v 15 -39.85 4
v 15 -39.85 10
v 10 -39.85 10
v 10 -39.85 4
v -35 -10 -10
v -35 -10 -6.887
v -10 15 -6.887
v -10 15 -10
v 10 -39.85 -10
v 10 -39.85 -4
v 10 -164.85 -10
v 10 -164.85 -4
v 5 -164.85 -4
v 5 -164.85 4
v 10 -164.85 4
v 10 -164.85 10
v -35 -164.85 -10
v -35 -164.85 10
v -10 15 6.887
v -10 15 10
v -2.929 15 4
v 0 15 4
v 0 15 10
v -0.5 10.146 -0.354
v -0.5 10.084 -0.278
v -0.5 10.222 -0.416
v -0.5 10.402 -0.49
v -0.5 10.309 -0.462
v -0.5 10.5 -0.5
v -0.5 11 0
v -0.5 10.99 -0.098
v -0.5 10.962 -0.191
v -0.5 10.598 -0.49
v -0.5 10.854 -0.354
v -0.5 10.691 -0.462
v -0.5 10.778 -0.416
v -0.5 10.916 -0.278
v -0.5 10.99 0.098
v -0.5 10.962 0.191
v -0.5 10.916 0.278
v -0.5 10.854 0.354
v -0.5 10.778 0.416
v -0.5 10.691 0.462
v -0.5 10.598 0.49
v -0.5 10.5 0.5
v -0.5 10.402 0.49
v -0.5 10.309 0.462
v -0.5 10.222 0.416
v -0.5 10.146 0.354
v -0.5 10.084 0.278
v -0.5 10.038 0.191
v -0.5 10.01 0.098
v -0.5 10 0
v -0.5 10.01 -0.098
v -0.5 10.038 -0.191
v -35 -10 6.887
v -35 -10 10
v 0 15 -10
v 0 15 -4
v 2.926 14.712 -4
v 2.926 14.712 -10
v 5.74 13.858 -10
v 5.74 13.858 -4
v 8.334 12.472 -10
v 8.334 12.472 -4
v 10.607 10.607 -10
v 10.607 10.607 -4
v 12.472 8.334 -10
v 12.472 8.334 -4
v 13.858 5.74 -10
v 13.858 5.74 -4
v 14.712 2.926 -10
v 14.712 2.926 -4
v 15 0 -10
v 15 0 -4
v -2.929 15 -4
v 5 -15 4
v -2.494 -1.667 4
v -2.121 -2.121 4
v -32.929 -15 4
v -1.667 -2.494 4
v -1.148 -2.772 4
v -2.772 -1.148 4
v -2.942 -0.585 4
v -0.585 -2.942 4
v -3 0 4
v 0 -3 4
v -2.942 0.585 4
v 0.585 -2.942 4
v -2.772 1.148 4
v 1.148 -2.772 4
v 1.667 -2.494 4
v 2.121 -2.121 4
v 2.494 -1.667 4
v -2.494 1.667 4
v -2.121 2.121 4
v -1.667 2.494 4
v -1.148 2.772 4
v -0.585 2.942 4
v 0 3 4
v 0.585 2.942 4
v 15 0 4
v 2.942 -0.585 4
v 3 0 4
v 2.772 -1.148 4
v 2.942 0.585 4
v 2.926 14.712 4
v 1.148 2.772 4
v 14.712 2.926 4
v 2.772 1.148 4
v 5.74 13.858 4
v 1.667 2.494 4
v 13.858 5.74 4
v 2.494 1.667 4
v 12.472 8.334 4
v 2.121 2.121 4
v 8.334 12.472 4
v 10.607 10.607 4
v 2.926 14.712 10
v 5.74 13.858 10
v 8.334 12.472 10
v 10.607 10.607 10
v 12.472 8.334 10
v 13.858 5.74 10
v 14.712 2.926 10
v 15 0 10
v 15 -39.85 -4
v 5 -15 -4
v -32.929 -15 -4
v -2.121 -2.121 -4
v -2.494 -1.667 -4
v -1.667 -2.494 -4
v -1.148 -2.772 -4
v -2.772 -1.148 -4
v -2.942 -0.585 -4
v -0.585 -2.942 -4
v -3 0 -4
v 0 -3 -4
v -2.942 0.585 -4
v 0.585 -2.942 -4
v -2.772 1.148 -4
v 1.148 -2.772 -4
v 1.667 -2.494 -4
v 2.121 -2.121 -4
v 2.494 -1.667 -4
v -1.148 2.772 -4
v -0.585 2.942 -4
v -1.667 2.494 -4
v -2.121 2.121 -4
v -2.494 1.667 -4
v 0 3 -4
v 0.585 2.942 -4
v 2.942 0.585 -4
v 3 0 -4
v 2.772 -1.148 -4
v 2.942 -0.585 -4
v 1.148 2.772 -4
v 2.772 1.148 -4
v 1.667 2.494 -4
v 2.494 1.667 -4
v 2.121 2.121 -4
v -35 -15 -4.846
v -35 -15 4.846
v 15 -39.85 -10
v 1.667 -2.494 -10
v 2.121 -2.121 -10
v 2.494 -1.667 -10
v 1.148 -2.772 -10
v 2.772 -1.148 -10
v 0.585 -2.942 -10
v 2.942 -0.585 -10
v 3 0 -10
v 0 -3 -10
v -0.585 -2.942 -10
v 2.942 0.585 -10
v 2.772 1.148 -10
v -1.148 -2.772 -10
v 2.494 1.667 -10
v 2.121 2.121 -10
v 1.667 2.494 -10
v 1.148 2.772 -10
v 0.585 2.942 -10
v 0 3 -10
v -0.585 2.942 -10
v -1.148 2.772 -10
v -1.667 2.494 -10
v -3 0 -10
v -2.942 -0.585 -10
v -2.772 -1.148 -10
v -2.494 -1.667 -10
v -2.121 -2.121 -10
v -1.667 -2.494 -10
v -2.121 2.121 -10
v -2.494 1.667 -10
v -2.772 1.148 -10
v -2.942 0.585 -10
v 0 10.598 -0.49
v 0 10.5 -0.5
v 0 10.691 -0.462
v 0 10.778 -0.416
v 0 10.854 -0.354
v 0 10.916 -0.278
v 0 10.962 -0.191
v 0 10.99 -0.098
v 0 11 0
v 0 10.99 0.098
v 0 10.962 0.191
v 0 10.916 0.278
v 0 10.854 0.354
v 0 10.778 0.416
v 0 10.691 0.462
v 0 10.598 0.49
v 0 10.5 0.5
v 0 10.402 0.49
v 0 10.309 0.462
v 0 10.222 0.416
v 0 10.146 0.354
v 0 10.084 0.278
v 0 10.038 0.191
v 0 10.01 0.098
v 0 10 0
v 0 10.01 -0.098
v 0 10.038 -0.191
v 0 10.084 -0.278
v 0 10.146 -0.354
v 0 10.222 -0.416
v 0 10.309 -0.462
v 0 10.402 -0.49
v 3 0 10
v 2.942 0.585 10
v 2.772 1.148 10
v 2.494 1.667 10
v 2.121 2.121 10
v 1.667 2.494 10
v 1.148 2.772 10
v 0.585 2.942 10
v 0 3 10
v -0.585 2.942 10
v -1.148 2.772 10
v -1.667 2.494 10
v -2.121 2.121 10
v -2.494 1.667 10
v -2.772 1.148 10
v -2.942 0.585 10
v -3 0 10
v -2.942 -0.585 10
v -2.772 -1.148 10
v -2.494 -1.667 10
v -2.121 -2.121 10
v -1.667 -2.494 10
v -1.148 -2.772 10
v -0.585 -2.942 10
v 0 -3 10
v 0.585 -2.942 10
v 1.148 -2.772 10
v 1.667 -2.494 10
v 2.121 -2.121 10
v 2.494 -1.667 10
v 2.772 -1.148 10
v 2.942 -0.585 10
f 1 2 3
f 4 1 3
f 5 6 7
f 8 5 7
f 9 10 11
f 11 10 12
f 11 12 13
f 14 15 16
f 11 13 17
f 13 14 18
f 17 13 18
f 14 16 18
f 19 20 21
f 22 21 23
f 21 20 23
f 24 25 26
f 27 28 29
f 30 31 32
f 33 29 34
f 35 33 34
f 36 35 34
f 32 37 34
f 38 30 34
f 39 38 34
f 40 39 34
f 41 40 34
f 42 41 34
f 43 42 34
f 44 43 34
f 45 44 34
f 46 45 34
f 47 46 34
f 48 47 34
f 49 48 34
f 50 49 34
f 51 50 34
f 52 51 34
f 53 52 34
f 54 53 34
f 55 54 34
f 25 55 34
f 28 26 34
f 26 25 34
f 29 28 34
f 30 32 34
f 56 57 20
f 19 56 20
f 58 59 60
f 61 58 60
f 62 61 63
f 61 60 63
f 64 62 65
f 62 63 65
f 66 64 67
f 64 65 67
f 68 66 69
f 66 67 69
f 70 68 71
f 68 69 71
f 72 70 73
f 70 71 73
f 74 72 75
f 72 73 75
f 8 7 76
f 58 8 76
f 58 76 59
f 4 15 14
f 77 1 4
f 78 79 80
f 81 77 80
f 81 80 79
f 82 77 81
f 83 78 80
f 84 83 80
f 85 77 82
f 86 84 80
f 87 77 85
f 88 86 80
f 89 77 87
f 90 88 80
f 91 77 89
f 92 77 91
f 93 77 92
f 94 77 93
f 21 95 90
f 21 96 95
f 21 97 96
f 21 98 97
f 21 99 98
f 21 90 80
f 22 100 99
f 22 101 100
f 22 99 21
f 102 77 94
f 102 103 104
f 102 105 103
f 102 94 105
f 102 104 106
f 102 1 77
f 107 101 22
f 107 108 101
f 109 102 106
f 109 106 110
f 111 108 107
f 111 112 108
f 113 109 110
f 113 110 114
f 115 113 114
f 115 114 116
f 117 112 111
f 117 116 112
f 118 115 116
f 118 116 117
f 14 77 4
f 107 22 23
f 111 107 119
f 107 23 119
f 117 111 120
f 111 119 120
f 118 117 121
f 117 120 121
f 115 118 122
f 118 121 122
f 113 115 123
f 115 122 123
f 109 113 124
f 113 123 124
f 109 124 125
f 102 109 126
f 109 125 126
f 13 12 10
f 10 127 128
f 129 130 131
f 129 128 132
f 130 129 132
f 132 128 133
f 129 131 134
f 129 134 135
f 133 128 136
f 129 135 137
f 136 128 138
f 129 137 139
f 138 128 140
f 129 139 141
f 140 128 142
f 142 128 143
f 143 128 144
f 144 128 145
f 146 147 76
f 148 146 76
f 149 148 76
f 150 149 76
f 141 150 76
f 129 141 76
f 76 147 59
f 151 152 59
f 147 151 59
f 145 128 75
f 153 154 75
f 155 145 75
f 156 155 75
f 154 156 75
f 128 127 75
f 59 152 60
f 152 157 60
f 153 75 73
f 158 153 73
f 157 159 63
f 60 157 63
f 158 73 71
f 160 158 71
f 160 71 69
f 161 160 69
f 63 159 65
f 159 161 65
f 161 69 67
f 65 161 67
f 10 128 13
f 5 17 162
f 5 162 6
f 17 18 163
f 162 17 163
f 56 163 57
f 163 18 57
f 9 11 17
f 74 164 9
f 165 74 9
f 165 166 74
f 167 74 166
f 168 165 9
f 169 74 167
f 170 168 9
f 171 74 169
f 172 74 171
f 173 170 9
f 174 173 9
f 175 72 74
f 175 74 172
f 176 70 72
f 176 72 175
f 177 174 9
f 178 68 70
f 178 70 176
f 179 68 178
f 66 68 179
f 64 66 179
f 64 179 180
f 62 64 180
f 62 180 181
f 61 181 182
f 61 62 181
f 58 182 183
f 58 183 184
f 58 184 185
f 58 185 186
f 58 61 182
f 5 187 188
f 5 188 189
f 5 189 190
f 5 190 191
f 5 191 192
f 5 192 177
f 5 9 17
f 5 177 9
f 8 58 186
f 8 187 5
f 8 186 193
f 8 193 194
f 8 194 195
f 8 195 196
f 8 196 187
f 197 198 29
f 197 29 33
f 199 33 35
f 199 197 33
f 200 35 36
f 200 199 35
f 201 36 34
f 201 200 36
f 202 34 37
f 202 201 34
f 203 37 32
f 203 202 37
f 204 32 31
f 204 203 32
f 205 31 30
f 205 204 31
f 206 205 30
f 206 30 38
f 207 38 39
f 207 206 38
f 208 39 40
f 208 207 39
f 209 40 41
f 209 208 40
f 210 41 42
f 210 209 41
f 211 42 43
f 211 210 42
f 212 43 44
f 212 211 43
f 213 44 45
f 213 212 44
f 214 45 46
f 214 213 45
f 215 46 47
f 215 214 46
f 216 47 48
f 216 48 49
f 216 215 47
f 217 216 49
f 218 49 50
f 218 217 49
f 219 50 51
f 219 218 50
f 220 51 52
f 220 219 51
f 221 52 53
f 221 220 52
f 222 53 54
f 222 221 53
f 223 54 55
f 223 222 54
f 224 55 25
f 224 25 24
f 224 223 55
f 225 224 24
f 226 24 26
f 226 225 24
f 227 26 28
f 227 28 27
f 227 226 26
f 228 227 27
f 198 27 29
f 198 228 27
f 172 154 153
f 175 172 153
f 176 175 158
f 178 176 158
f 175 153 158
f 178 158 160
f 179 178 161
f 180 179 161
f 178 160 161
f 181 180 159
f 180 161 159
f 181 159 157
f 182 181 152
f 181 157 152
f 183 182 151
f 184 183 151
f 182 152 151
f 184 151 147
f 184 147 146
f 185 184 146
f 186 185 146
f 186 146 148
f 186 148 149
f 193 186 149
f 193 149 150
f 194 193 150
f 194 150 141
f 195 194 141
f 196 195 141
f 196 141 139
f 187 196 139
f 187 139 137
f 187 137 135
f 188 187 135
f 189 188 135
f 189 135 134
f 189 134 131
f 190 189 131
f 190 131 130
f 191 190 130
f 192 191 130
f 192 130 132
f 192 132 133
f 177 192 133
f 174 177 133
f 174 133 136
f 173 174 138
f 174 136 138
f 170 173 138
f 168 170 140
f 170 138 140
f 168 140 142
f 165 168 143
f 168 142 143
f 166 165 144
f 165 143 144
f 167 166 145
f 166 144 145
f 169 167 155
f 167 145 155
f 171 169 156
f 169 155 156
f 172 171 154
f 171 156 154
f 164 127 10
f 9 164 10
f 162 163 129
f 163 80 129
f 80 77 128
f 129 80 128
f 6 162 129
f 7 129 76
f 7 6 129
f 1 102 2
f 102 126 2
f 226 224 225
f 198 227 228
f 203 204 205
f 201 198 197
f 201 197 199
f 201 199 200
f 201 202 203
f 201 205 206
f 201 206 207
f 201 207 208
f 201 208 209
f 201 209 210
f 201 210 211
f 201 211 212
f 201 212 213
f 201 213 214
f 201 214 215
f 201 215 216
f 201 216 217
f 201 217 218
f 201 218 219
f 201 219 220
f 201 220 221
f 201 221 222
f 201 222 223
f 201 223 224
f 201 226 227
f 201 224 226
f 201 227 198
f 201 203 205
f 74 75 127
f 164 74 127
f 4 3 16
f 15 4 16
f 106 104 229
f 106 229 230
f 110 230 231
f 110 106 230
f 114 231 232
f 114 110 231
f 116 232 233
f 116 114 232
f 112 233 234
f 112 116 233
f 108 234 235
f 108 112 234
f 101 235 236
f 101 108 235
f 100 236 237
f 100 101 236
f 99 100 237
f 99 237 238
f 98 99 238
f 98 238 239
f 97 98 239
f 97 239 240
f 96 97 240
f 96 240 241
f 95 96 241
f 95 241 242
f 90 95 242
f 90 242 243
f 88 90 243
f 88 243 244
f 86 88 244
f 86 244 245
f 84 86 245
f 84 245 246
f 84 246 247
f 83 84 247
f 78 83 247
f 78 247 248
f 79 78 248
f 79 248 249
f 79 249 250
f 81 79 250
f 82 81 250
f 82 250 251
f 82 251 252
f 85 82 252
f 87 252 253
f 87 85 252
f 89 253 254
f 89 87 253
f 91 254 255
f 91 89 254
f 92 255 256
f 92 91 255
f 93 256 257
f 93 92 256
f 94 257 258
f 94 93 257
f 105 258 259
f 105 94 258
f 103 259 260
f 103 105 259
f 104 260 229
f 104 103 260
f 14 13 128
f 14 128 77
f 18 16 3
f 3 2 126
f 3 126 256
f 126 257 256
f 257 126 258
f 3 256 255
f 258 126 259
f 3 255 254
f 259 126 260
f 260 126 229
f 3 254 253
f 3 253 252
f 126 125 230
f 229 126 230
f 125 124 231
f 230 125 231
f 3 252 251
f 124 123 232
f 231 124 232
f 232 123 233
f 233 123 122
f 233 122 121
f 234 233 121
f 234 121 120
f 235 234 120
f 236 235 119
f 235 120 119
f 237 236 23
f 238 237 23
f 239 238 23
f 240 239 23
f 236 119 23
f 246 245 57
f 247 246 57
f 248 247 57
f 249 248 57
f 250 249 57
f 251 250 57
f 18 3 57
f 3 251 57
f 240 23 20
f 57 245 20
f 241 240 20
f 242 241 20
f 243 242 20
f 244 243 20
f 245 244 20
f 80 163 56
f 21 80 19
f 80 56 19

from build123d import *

# Parameters (mm, degrees)
ESQUISSE1_R             = 3
EXTRUSION1_DEPTH        = 10
EXTRUSION1_DEPTH_BACK   = 10
ESQUISSE2_W             = 8
ESQUISSE2_H             = 38.994969405
ENL_V_MAT_EXTRU_2_DEPTH = 51
CHANFREIN1_SIZE         = 5
CHANFREIN1_SIZE2        = 2.886751346
CHANFREIN1_PART_2_SIZE  = 5
CHANFREIN1_PART_2_SIZE2 = 2.886751346
ESQUISSE3_W             = 10.585305106
ESQUISSE3_H             = 8
ENL_V_MAT_EXTRU_3_DEPTH = 150.85
ESQUISSE4_R             = 0.5
EXTRUSION2_DEPTH        = 0.5


with BuildPart() as part:
    # Esquisse1 → Extrusion1 (new body, two sides)
    with BuildSketch(Plane.XY) as extrusion1_sk:
        with BuildLine():
            Line((-35, -10), (-10, 15))
            Line((-10, 15), (0, 15))
            ThreePointArc((0, 15), (10.606601718, 10.606601718), (15, 0))
            Line((15, 0), (15, -39.85))
            Line((15, -39.85), (10, -39.85))
            Line((10, -39.85), (10, -164.85))
            Line((10, -164.85), (-35, -164.85))
            Line((-35, -164.85), (-35, -10))
        make_face()
        Circle(ESQUISSE1_R, mode=Mode.SUBTRACT)
    extrude(amount=EXTRUSION1_DEPTH)
    extrude(extrusion1_sk.sketch, amount=-EXTRUSION1_DEPTH_BACK)

    # Esquisse2 → Enl_v. mat.-Extru.2 (cut, through all)
    with BuildSketch(Plane(origin=(15, 0, 0), x_dir=(0, 0, -1), z_dir=(1, 0, 0))):
        with Locations((0, 4.497484703)):
            Rectangle(ESQUISSE2_W, ESQUISSE2_H)
    extrude(amount=-ENL_V_MAT_EXTRU_2_DEPTH, mode=Mode.SUBTRACT)

    # Chanfrein1
    chanfrein1_edges = [part.edges().sort_by_distance(p)[0] for p in [
        (-22.5, 2.5, 4),
    ]]
    chanfrein1_side = [part.faces().sort_by_distance(p)[0] for p in [
        (-6.507250636, -2.381616227, 4),
    ]]
    chamfer(chanfrein1_edges, length=CHANFREIN1_SIZE, length2=CHANFREIN1_SIZE2, reference=chanfrein1_side[0])

    # Chanfrein1 part 2
    chanfrein1_part_2_edges = [part.edges().sort_by_distance(p)[0] for p in [
        (-22.5, 2.5, -4),
    ]]
    chanfrein1_part_2_side = [part.faces().sort_by_distance(p)[0] for p in [
        (-6.507250636, -2.381616227, -4),
    ]]
    chamfer(chanfrein1_part_2_edges, length=CHANFREIN1_PART_2_SIZE, length2=CHANFREIN1_PART_2_SIZE2, reference=chanfrein1_part_2_side[0])

    # Esquisse3 → Enl_v. mat.-Extru.3 (cut, through all)
    with BuildSketch(Plane(origin=(0, -15, 0), x_dir=(-1, 0, 0), z_dir=(0, 1, 0))):
        with Locations((-10.292652553, 0)):
            Rectangle(ESQUISSE3_W, ESQUISSE3_H)
    extrude(amount=-ENL_V_MAT_EXTRU_3_DEPTH, mode=Mode.SUBTRACT)


with BuildPart() as body_2:
    # Esquisse4 → Extrusion2 (new body)
    with BuildSketch(Plane(origin=(0, 0, 0), x_dir=(0, 0, -1), z_dir=(1, 0, 0))):
        with Locations((0, 10.5)):
            Circle(ESQUISSE4_R)
    extrude(amount=-EXTRUSION2_DEPTH)


solid = Compound([part.part, body_2.part])
